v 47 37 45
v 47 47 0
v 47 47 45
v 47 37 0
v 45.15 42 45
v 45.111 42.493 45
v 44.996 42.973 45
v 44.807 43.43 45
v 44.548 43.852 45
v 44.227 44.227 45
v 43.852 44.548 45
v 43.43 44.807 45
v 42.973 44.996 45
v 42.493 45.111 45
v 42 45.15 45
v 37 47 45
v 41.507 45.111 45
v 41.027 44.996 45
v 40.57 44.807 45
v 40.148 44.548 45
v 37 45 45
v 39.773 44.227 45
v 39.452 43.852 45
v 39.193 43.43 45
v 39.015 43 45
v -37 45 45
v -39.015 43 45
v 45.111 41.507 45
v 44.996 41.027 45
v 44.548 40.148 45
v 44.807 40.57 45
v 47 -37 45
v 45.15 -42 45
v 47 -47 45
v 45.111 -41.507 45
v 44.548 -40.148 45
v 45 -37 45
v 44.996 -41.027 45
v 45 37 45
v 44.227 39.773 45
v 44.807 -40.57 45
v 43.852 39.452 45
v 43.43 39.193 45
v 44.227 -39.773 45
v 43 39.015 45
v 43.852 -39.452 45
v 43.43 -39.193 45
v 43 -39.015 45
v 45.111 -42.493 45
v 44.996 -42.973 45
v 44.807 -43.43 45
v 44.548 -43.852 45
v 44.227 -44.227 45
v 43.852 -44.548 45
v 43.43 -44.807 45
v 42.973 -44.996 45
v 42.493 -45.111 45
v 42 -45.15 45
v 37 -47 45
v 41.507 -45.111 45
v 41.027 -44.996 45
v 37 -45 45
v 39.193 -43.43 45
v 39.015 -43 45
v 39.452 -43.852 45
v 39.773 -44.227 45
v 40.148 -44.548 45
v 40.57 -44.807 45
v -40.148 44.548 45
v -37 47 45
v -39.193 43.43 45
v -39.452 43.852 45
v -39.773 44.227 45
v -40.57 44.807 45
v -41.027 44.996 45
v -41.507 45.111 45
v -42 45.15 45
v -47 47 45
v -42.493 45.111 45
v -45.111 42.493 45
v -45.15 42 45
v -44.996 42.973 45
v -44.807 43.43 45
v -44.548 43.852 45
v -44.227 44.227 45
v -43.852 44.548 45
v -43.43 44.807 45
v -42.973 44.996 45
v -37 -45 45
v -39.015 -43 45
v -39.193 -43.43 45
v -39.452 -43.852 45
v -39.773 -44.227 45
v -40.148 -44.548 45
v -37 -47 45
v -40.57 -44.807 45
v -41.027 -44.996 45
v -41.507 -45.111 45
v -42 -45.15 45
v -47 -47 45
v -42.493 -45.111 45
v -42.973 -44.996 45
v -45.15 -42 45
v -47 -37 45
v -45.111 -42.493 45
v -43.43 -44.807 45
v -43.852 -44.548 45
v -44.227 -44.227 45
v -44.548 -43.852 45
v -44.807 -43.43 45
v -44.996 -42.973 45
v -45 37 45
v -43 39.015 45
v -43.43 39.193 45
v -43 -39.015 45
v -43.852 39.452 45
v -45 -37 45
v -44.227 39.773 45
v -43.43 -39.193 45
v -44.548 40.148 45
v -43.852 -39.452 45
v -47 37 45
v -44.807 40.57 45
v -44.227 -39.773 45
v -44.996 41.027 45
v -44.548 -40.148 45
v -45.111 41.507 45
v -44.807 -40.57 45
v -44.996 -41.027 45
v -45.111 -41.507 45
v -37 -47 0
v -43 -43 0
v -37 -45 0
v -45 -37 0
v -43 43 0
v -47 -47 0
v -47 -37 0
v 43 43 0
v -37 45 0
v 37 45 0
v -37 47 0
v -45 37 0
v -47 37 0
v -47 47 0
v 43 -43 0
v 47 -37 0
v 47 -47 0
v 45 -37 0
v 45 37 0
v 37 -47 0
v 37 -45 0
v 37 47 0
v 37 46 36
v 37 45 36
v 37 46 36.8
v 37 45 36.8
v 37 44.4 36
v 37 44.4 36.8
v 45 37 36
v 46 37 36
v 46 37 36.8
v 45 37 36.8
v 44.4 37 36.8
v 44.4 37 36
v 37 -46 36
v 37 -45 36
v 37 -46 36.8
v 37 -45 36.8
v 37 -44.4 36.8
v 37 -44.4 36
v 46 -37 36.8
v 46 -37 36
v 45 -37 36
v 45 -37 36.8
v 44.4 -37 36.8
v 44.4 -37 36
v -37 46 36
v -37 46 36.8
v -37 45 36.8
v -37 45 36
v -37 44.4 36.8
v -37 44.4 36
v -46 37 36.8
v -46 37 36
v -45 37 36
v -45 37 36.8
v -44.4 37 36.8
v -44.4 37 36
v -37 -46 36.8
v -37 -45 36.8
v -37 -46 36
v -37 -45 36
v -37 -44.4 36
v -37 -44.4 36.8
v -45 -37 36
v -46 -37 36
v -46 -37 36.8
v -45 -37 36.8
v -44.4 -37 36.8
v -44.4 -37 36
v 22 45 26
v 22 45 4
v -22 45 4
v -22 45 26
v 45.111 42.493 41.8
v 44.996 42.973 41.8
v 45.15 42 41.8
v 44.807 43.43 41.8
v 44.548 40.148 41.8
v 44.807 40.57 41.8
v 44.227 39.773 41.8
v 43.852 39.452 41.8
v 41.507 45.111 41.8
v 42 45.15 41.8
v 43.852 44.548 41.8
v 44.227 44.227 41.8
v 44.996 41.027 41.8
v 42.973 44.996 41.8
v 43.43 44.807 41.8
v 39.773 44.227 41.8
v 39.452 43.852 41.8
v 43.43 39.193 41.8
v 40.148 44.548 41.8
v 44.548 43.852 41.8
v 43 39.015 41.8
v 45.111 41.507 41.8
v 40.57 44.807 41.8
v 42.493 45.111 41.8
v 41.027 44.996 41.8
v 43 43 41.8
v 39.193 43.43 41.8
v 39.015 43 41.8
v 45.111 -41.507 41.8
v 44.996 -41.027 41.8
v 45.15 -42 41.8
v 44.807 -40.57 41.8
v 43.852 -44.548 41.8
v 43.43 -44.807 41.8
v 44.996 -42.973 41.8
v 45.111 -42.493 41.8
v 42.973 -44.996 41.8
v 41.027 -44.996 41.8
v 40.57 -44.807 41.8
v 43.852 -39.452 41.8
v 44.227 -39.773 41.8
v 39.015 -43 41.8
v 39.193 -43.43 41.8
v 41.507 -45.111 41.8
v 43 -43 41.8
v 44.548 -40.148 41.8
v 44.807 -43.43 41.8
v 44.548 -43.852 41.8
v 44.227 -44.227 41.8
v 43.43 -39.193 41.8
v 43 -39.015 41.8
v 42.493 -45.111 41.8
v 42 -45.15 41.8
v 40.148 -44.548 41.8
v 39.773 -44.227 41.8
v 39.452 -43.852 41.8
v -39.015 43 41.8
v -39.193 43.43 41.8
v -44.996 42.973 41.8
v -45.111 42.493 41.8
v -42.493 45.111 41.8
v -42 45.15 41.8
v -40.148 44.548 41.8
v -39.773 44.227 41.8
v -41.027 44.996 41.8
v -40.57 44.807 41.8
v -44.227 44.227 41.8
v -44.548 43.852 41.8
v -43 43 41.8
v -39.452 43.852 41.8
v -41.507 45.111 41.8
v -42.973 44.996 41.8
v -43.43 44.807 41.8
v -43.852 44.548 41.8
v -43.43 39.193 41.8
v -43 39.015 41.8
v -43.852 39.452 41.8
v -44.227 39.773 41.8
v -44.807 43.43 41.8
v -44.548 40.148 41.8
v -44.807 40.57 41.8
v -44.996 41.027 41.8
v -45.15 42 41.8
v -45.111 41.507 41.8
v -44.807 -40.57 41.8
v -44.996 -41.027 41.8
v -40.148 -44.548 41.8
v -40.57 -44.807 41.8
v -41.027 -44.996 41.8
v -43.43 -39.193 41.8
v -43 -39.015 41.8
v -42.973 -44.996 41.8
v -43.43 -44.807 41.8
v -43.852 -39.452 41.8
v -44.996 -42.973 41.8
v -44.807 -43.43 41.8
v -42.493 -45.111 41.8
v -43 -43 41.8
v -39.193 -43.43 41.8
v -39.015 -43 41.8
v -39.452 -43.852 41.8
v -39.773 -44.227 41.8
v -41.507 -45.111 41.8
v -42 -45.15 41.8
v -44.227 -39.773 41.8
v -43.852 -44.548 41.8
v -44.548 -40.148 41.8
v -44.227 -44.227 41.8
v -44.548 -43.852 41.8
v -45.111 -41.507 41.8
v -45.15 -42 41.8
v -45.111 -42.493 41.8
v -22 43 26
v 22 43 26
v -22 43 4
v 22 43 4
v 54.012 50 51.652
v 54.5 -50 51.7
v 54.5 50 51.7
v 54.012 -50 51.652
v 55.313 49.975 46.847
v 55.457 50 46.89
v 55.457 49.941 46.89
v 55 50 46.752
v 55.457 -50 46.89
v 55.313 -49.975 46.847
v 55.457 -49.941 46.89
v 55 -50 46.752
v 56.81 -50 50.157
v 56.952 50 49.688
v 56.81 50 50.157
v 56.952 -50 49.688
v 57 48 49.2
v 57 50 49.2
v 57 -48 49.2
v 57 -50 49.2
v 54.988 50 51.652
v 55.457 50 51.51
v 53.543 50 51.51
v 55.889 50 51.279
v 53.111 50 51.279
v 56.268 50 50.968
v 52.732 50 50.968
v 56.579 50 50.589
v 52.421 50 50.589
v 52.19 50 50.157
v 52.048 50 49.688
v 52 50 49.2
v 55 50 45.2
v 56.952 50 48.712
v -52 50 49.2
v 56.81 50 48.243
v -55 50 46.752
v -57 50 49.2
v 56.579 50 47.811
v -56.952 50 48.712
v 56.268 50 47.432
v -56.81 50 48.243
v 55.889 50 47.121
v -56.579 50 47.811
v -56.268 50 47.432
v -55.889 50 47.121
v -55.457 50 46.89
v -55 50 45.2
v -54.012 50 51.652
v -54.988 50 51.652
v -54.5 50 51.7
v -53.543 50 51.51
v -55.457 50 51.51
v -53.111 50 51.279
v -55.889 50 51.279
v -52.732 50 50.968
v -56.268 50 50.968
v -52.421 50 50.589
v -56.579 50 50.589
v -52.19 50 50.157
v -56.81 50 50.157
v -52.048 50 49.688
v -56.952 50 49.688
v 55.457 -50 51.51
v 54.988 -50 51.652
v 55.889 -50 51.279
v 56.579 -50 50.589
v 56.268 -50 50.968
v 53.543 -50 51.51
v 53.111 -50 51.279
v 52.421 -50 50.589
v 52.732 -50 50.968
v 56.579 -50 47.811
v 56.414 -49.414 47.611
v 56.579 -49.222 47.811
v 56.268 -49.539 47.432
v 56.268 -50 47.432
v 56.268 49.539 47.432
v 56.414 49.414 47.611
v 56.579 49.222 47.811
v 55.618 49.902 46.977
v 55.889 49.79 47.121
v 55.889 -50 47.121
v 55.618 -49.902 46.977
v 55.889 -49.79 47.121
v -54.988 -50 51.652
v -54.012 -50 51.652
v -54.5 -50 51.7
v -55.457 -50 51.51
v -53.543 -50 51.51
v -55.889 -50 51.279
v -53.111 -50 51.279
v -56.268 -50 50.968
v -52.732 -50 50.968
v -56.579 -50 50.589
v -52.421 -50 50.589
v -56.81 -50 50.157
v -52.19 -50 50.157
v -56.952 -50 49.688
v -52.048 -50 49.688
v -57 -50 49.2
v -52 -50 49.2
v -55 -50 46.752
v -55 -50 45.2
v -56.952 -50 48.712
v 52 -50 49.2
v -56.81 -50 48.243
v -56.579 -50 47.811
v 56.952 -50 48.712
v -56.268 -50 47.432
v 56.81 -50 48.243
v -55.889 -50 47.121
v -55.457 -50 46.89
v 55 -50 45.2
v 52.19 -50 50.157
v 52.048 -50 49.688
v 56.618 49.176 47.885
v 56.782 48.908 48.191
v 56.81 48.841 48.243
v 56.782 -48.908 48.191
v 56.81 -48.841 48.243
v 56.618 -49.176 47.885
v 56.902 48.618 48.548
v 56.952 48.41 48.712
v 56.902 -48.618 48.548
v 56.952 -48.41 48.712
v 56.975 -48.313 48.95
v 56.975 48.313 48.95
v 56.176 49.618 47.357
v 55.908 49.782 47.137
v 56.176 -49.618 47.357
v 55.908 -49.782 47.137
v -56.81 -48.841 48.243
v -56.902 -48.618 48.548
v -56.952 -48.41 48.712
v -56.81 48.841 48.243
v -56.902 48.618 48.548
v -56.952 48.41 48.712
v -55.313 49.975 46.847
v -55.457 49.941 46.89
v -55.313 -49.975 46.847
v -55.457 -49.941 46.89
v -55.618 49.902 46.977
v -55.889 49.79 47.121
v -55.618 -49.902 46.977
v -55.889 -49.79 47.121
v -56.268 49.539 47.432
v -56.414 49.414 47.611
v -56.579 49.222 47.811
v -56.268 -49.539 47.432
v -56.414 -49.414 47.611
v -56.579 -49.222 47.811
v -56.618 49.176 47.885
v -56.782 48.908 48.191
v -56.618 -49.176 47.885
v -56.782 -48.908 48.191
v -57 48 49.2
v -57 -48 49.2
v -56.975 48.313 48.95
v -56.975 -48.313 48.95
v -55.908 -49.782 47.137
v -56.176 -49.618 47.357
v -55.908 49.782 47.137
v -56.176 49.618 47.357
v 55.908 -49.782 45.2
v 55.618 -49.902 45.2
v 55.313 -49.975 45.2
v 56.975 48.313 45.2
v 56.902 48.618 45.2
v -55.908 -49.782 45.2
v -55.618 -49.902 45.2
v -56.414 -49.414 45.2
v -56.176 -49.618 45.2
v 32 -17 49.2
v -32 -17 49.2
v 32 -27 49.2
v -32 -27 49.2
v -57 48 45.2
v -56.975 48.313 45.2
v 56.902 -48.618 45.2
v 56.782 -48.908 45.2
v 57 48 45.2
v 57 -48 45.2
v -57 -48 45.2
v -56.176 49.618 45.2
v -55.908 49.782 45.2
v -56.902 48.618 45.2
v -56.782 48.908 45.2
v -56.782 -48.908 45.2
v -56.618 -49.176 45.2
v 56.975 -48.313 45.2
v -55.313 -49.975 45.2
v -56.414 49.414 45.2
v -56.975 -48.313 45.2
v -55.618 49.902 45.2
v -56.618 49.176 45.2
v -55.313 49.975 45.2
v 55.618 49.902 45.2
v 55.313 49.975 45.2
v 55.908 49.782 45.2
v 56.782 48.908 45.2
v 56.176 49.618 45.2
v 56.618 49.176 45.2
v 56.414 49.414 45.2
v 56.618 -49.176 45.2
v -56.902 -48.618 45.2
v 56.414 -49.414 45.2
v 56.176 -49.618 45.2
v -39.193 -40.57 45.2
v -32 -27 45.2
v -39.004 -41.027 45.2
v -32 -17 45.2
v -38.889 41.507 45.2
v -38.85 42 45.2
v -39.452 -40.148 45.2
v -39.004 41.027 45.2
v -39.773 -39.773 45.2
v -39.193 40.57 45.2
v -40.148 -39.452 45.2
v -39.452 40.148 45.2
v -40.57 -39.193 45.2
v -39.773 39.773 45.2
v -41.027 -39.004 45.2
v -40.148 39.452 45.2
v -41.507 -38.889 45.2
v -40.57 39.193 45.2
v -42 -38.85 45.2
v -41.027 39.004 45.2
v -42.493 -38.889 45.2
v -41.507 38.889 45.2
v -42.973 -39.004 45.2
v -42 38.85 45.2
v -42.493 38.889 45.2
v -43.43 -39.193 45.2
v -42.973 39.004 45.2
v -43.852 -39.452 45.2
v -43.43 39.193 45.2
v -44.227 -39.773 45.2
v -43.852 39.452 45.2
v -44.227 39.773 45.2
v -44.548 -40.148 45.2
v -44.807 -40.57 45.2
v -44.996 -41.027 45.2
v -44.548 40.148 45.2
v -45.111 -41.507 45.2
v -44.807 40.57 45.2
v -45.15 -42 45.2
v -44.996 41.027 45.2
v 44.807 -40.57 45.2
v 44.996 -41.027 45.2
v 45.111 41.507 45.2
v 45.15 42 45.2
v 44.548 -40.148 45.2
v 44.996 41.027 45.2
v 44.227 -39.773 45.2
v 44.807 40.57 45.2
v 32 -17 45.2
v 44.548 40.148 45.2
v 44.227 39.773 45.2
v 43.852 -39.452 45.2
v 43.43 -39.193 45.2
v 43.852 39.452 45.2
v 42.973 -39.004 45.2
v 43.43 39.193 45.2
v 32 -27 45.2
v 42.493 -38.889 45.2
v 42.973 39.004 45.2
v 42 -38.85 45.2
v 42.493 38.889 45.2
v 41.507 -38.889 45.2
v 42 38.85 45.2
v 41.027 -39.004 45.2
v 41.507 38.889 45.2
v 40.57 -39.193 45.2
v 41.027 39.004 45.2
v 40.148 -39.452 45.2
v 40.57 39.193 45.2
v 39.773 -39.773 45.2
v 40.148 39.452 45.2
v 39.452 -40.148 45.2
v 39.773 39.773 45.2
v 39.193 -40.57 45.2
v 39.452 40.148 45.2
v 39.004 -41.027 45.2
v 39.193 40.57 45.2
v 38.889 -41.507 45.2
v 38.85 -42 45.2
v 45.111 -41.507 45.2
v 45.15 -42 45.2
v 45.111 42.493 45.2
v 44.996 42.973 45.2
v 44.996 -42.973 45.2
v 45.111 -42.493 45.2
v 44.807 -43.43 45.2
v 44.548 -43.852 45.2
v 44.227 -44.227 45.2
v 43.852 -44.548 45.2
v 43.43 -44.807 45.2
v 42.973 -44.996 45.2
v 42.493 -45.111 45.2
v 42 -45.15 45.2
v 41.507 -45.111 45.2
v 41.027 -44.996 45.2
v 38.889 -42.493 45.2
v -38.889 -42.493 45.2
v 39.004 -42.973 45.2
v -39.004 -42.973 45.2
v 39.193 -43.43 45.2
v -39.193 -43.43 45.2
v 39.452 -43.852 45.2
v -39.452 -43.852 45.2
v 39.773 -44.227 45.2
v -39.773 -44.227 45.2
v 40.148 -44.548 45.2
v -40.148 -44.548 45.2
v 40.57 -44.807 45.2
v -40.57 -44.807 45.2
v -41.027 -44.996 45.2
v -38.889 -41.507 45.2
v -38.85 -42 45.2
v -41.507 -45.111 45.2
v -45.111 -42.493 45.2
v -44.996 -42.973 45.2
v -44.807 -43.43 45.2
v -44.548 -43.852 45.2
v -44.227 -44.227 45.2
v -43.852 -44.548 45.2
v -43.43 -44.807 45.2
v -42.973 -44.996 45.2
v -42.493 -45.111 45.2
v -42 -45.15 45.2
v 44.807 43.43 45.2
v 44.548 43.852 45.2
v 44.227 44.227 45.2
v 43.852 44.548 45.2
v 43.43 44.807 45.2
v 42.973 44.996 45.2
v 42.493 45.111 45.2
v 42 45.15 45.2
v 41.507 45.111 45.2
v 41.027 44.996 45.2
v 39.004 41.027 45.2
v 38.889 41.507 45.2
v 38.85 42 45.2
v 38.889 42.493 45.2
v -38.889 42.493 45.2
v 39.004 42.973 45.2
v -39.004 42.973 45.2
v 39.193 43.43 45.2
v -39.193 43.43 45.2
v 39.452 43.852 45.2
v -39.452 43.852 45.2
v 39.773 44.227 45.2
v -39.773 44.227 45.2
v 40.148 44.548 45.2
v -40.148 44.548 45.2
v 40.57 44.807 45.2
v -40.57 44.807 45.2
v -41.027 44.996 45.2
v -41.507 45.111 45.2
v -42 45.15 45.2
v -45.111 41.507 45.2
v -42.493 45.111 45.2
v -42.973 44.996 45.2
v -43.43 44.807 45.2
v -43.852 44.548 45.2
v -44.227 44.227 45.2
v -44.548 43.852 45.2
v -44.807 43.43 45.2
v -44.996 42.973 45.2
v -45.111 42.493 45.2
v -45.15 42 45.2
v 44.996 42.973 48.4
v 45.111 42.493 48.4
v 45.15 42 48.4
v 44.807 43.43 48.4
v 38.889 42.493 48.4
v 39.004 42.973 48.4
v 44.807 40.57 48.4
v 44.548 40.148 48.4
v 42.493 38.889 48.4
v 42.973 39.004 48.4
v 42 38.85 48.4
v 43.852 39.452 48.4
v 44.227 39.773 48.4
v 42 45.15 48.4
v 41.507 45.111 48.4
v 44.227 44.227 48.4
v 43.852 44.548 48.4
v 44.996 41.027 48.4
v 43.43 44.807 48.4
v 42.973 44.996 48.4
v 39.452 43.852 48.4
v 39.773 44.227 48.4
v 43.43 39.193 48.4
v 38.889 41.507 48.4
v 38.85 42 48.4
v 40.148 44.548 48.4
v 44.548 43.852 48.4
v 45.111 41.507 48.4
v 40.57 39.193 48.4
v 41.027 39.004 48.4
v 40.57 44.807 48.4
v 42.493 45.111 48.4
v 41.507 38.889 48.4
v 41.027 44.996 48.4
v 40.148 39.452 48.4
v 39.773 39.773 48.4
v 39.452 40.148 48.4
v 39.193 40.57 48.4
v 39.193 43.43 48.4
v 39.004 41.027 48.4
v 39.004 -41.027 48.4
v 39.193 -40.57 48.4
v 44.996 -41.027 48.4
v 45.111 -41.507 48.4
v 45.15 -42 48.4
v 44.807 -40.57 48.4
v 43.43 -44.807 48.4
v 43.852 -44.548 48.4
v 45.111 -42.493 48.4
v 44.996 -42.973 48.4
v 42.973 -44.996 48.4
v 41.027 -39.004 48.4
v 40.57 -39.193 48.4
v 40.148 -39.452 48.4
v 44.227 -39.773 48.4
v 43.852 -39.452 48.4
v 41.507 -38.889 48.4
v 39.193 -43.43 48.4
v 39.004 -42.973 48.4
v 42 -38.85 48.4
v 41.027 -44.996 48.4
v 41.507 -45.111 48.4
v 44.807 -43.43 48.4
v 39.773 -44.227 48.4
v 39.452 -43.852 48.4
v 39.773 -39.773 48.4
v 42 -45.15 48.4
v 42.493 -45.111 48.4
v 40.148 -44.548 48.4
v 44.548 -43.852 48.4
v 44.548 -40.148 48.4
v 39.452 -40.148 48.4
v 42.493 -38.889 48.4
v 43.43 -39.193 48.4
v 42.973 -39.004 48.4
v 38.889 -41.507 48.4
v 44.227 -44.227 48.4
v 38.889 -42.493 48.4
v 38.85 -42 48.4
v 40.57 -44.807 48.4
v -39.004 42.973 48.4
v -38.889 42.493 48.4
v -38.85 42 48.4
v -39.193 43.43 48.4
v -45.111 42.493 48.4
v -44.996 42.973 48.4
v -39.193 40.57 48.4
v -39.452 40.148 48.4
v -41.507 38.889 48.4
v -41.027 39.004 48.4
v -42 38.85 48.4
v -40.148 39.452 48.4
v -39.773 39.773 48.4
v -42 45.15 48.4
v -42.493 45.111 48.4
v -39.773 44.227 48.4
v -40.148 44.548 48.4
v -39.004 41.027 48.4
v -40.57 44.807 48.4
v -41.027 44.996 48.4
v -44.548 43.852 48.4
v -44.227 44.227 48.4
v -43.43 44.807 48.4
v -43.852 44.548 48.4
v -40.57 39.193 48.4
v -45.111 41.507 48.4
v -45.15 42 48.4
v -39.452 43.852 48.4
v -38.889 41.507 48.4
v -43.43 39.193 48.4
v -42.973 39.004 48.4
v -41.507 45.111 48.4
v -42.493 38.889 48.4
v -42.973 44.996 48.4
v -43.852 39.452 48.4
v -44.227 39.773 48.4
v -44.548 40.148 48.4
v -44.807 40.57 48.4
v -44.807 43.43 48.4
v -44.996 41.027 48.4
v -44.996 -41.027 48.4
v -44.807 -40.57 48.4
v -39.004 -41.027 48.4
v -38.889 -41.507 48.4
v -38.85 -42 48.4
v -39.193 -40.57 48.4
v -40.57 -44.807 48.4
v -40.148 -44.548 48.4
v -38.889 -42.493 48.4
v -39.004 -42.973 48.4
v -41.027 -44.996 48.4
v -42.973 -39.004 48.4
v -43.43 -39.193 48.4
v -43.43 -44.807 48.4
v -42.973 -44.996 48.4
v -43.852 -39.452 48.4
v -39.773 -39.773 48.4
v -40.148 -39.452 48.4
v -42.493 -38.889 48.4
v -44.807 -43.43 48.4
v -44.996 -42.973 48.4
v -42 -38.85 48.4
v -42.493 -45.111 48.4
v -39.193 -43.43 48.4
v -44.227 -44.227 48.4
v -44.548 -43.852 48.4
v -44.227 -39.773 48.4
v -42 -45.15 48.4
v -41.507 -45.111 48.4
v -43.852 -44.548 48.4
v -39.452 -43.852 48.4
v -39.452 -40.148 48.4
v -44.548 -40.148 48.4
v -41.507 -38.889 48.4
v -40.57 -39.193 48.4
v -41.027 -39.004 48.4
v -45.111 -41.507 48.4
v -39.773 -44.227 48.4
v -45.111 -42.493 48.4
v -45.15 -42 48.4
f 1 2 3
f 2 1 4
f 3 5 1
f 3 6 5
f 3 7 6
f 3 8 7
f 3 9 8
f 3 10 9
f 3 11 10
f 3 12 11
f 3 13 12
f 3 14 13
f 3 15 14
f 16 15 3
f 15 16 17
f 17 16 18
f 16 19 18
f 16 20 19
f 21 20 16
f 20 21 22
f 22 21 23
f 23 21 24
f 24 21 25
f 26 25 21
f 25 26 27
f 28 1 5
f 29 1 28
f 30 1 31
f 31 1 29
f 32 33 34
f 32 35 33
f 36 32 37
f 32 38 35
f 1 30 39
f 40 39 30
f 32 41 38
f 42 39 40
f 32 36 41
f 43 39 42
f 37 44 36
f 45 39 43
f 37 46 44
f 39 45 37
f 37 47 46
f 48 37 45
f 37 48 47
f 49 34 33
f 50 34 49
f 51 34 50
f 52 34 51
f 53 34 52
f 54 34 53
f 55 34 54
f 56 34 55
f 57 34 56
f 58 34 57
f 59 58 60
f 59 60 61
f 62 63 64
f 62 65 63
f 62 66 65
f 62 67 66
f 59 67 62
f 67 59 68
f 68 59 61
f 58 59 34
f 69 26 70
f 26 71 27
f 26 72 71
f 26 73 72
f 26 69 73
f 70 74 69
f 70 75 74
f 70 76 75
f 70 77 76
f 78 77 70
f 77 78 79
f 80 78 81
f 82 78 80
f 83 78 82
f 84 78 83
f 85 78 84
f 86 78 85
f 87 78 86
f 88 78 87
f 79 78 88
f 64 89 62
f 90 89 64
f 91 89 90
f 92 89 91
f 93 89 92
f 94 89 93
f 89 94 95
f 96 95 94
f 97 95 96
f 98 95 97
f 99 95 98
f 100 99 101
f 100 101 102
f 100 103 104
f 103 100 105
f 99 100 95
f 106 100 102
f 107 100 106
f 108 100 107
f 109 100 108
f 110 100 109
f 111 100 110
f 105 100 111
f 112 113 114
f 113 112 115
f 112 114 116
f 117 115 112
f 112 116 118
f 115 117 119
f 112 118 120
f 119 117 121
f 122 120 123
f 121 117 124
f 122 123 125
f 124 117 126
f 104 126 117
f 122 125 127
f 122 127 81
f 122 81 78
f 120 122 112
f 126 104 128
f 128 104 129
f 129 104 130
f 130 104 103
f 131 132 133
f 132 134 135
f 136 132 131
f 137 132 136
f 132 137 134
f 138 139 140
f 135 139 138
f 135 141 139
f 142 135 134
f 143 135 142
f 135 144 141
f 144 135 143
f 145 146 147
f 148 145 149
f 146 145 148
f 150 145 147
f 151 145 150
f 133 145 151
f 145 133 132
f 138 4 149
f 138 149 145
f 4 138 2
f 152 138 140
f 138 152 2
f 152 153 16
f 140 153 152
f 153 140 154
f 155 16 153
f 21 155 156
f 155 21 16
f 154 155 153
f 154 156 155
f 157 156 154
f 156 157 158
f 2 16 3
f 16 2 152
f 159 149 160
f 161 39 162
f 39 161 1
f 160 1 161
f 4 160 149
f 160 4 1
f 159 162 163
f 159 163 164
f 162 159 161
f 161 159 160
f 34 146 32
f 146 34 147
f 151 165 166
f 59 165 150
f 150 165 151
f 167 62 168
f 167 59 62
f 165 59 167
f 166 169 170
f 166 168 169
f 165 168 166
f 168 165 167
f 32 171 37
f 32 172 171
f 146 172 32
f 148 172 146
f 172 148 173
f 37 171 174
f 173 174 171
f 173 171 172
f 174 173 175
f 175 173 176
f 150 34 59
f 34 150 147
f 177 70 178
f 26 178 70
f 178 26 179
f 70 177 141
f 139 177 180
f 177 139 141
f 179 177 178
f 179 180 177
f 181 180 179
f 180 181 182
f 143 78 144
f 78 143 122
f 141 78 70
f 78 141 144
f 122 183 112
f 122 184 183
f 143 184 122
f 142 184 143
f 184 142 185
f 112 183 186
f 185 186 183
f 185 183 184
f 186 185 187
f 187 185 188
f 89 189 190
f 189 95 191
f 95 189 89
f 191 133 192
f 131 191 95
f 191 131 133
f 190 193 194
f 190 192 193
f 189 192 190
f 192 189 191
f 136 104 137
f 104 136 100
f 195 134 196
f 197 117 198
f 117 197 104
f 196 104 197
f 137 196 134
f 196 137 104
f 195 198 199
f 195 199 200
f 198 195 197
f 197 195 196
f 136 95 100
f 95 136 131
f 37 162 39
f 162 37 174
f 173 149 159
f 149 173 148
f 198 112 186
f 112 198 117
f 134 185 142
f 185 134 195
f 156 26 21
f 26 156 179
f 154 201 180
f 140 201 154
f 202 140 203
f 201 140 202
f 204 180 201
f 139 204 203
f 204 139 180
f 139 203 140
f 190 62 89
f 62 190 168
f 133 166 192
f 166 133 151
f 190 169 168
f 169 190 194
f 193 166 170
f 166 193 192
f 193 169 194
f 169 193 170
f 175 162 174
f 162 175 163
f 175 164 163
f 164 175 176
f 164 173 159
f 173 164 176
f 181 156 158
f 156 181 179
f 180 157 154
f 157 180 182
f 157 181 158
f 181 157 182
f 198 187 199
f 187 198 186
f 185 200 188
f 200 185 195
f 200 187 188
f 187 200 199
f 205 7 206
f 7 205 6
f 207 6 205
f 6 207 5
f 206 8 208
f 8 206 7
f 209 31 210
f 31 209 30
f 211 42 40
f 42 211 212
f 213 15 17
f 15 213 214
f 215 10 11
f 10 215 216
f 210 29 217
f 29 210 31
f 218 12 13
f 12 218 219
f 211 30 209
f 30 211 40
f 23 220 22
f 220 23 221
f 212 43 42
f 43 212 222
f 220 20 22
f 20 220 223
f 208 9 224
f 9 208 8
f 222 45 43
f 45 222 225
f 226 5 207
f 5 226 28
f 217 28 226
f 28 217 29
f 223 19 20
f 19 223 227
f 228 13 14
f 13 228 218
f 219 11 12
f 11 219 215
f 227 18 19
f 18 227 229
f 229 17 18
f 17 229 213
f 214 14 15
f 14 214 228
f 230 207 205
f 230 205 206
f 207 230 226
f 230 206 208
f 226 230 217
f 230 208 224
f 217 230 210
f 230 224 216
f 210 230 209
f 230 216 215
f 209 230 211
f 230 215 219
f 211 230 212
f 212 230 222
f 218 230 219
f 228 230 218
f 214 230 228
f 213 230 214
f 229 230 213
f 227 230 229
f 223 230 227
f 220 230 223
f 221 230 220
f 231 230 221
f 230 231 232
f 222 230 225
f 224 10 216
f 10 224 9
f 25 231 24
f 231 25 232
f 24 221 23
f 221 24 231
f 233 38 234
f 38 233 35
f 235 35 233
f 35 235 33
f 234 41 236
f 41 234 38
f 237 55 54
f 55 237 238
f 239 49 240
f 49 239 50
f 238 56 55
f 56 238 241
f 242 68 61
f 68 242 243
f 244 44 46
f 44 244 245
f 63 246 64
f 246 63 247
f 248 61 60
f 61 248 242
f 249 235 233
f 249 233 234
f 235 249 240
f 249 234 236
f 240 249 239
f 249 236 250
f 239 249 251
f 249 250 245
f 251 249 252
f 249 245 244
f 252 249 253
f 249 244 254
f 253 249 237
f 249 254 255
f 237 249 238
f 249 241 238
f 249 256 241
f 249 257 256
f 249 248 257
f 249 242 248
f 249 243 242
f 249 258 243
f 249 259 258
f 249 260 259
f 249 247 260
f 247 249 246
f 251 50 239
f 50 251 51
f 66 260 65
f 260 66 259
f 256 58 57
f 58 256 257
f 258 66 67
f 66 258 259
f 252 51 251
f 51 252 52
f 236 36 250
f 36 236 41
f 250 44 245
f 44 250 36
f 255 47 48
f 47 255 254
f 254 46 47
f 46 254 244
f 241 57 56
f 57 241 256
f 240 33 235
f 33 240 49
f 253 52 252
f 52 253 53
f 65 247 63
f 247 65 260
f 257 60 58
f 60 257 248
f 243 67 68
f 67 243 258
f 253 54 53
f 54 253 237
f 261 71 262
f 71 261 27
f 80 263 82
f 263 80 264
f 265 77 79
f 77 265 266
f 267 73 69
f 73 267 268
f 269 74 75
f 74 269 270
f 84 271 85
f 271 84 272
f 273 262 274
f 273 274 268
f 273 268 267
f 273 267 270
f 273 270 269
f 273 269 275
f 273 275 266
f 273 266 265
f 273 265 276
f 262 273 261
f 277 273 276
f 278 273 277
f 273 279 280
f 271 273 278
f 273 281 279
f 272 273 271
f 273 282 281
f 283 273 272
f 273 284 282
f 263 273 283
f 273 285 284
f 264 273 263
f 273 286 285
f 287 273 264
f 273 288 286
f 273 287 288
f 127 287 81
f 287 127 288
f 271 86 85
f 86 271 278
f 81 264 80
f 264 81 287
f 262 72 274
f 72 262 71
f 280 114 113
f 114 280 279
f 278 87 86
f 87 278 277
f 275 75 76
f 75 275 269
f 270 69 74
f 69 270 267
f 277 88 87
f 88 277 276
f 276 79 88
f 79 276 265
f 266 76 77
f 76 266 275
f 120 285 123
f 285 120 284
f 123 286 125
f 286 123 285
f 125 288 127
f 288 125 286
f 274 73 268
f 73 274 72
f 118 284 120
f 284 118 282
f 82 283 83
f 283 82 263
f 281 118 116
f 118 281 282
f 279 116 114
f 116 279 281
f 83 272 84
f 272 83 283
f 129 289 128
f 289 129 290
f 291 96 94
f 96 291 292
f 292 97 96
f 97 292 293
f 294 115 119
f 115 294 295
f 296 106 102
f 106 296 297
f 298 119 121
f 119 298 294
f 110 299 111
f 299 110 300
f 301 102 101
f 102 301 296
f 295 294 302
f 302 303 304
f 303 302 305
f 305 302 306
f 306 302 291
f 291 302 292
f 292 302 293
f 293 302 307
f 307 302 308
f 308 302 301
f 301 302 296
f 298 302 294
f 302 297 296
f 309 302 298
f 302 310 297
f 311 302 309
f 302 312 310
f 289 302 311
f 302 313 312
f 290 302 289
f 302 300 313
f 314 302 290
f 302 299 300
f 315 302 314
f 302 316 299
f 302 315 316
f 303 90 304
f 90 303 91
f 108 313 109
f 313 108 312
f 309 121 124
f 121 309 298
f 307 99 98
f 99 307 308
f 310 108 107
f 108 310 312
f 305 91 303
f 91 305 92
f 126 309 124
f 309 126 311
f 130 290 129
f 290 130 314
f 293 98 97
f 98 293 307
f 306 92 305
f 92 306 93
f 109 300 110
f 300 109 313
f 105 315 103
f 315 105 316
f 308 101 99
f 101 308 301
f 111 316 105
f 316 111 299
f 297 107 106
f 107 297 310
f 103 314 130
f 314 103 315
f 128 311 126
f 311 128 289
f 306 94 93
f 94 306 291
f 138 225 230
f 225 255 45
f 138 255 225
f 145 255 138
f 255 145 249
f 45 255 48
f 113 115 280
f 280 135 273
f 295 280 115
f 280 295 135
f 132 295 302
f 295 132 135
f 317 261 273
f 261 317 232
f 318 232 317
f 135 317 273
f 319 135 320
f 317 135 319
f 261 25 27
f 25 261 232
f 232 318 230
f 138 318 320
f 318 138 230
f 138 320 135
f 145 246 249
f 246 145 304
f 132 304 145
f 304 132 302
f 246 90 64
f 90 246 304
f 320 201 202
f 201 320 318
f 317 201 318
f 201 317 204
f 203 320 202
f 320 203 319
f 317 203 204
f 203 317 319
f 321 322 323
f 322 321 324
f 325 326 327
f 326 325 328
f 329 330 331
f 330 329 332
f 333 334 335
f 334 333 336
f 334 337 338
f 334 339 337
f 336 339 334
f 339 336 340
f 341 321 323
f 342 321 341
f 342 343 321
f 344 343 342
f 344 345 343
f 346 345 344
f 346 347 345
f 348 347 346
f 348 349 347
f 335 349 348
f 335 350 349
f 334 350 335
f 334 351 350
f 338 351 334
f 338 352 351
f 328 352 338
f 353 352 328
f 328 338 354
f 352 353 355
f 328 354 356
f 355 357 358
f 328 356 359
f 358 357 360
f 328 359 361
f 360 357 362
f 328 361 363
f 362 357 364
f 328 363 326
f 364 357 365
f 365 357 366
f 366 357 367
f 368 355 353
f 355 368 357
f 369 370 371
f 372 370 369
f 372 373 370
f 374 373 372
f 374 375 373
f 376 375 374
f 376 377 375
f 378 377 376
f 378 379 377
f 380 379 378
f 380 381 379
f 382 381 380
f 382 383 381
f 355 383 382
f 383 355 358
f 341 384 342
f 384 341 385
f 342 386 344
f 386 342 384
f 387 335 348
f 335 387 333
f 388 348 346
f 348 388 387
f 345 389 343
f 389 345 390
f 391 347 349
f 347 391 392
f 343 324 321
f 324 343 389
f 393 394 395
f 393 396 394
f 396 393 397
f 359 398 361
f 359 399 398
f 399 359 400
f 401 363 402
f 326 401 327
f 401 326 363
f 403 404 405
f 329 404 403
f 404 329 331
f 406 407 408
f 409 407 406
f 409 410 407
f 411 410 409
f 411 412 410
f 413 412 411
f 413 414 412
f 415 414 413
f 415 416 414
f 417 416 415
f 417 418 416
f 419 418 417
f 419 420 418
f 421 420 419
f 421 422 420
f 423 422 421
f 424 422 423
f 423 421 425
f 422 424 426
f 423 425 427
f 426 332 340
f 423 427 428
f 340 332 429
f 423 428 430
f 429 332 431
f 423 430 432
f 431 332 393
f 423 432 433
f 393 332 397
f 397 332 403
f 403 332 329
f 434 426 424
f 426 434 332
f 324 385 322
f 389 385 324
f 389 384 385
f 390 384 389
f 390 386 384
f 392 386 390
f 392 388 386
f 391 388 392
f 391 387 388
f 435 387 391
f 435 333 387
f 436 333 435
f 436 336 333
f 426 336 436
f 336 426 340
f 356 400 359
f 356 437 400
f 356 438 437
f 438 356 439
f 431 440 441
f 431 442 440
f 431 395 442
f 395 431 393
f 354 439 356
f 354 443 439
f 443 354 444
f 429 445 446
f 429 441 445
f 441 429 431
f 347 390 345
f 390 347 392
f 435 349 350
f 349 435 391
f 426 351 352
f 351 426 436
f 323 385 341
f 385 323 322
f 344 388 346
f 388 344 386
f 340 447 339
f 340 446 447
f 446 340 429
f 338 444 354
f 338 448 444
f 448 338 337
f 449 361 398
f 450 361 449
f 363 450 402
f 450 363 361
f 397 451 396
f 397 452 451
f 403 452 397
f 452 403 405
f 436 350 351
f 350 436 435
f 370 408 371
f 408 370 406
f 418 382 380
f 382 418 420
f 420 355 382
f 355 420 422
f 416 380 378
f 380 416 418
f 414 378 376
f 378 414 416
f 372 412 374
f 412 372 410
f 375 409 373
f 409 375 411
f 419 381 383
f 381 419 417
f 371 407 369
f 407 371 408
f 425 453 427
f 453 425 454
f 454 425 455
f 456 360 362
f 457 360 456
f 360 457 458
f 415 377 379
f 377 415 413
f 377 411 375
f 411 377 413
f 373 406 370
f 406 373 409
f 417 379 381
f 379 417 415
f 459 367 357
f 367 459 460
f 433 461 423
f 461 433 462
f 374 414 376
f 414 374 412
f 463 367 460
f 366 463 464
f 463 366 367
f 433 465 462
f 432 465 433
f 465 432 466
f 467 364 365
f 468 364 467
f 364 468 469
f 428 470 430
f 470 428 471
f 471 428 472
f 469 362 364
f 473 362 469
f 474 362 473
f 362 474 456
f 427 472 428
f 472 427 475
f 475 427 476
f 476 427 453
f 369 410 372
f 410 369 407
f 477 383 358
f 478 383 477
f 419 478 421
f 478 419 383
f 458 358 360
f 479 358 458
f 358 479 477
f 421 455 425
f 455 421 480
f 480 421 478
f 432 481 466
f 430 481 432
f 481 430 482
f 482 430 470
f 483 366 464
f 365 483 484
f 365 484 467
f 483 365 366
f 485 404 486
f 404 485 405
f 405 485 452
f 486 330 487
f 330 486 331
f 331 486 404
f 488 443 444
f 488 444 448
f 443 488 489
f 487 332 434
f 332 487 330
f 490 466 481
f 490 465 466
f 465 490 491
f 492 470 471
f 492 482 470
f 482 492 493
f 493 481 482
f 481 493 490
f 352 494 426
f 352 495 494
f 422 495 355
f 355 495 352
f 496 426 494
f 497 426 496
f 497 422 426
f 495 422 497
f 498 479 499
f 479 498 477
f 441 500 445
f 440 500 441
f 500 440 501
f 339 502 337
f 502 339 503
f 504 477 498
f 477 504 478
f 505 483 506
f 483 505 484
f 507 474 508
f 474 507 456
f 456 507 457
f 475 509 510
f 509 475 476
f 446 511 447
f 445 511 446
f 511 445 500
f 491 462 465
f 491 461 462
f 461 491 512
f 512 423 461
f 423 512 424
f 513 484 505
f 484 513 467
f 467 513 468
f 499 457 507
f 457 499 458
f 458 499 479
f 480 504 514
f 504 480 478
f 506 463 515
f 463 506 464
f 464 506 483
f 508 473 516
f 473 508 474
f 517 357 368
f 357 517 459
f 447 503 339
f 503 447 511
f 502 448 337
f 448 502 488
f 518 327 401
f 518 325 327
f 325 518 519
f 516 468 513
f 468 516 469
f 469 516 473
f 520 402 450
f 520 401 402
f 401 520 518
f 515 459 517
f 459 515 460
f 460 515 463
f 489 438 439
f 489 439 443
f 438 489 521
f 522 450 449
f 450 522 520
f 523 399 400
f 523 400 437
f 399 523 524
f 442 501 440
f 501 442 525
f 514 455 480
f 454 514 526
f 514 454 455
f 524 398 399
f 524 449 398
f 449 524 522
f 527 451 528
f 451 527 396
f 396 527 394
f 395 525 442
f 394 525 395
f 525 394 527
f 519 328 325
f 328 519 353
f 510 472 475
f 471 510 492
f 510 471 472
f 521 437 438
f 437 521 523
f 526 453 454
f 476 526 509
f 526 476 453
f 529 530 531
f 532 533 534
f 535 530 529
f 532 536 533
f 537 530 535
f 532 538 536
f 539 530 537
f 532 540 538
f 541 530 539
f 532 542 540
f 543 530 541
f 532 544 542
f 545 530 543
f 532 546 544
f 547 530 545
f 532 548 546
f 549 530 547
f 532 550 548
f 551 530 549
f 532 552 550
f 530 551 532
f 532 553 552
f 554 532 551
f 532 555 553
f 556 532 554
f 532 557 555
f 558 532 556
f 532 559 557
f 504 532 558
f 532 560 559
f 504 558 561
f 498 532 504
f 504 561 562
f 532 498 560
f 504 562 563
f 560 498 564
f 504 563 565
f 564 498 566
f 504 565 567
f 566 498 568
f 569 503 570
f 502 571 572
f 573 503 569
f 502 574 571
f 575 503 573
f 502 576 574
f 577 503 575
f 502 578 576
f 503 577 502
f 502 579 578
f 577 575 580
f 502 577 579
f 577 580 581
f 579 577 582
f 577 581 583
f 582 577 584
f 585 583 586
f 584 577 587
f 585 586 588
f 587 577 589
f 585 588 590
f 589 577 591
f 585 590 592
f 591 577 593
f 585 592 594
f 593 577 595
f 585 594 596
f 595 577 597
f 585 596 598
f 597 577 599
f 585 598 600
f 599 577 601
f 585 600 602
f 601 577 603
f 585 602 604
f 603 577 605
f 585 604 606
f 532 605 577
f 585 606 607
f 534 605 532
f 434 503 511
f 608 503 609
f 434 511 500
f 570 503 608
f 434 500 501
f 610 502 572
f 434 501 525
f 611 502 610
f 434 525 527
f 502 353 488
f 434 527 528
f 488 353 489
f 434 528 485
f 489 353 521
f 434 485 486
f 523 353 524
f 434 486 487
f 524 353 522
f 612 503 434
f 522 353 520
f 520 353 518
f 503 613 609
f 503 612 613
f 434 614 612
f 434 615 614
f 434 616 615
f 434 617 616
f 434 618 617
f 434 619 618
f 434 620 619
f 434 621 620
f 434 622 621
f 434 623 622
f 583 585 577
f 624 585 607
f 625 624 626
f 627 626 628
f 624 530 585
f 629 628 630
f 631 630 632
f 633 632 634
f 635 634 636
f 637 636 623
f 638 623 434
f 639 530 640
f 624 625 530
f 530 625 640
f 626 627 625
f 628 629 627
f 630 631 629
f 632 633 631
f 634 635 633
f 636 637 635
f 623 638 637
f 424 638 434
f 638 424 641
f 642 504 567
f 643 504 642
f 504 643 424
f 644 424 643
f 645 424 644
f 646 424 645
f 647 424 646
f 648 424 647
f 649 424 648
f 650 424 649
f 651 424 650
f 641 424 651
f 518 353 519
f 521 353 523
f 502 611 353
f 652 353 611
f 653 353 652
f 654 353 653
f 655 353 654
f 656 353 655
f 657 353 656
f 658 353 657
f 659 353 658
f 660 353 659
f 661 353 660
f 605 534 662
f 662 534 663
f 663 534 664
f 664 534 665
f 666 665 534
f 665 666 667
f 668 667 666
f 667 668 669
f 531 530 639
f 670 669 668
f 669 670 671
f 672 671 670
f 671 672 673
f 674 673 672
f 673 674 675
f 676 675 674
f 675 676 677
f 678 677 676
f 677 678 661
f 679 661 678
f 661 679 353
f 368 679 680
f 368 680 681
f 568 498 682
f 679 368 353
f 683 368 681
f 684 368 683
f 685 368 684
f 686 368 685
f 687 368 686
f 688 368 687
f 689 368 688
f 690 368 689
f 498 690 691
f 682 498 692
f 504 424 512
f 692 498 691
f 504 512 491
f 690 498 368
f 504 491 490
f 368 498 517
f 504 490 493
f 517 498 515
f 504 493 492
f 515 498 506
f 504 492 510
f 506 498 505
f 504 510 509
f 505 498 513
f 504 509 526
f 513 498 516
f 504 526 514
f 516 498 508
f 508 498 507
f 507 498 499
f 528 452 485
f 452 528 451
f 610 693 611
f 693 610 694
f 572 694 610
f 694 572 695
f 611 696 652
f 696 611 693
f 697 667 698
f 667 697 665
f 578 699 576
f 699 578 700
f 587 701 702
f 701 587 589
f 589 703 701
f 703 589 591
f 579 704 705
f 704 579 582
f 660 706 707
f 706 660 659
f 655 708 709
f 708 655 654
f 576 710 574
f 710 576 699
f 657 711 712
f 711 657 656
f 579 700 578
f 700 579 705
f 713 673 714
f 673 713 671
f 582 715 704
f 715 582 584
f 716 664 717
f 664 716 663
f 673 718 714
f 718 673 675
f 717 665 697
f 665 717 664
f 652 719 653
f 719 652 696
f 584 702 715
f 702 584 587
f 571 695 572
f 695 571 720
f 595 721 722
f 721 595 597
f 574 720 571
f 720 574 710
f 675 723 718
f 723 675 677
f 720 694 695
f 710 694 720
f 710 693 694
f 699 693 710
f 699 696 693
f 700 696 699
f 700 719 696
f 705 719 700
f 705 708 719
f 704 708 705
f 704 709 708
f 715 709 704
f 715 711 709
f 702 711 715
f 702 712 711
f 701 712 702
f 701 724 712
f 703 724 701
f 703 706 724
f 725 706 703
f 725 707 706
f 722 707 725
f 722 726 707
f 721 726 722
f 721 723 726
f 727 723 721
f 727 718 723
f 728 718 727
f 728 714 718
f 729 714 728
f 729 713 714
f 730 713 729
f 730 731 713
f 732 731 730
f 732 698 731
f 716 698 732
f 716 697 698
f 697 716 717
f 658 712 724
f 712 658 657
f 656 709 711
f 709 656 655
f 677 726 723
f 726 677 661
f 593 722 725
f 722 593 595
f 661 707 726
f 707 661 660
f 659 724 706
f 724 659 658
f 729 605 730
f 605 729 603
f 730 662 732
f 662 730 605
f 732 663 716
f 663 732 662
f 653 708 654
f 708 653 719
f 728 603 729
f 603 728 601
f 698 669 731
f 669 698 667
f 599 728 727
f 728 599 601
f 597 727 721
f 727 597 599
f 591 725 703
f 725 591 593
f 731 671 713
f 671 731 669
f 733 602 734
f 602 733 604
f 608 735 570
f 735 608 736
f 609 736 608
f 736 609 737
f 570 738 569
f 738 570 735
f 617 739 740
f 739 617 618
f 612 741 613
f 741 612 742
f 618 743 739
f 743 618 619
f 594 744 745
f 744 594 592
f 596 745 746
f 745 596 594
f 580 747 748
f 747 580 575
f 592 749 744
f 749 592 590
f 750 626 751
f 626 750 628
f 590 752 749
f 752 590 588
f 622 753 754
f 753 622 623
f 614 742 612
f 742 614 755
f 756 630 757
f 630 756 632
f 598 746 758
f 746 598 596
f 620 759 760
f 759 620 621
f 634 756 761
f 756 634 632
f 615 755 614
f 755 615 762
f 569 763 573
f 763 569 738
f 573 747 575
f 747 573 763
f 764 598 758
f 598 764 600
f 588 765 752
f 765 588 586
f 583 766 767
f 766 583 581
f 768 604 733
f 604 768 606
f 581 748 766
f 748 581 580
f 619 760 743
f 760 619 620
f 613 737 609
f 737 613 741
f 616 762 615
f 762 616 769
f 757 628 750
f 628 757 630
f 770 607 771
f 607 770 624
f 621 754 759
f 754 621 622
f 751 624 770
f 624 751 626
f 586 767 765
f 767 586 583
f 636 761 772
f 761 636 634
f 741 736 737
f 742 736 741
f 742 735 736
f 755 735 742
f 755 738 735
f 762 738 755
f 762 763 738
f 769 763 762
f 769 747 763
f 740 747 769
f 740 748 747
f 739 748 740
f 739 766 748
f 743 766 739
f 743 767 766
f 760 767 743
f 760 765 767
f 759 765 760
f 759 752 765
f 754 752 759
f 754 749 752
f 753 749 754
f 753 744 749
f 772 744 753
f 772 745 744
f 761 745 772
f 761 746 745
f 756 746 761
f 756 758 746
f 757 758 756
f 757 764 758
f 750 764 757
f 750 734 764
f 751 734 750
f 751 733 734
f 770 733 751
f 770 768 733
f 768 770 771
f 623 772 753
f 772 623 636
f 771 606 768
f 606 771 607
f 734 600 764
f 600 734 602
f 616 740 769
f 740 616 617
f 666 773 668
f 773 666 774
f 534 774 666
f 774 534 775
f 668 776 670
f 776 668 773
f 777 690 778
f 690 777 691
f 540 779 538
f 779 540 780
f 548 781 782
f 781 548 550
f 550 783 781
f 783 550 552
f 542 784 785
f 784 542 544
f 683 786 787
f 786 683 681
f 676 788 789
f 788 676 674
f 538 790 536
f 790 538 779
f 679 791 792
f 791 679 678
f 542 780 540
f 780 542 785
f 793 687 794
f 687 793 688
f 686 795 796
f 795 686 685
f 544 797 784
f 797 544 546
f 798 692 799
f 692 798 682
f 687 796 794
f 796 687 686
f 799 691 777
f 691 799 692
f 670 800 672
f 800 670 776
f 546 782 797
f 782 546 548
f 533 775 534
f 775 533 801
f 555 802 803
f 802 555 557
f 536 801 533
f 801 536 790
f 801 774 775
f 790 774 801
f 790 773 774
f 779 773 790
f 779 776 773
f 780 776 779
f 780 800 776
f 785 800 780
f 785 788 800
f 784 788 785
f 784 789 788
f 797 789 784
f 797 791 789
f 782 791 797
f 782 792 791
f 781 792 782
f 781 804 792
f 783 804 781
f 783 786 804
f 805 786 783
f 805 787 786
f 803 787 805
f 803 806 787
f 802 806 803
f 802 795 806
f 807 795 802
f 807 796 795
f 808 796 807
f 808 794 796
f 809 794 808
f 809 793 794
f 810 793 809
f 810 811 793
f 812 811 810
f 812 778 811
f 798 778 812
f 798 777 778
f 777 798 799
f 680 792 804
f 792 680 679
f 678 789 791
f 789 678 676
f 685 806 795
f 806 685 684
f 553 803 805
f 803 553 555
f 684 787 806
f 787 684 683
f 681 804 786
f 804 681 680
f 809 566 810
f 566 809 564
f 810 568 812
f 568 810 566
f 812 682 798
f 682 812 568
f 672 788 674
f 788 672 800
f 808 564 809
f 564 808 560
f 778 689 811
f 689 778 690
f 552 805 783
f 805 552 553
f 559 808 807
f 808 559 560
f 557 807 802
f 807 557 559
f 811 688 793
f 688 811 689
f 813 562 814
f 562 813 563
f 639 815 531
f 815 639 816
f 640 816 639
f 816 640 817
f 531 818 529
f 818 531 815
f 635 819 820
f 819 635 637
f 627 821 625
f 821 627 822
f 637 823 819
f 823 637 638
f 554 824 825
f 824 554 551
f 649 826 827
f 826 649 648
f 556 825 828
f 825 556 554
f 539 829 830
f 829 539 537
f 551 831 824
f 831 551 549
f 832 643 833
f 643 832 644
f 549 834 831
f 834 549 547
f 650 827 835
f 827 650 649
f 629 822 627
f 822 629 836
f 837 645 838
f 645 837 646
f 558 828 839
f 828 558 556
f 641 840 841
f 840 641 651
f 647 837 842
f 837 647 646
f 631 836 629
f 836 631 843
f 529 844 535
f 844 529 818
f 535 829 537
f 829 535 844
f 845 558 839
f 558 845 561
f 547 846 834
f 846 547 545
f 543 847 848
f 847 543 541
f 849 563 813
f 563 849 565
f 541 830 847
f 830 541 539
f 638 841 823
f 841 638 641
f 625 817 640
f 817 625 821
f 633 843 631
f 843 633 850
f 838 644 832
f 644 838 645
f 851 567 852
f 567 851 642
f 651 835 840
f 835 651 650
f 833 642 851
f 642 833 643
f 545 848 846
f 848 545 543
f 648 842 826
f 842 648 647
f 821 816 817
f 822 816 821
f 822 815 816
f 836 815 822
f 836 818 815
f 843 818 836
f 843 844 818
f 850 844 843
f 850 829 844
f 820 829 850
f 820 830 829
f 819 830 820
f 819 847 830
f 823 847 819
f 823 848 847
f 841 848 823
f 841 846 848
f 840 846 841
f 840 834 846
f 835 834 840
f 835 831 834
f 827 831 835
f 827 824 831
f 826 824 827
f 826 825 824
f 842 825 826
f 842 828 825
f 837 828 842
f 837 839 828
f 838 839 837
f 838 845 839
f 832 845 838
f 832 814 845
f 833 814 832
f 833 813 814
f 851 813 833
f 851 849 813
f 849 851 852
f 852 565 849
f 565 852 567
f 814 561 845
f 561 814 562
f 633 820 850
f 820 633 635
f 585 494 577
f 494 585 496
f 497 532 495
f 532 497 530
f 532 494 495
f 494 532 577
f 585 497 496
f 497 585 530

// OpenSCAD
// 文机（ふづくえ）：感熱プリンタ BluwieBroka S1 のカバー
//  body … 四隅に脚のある箱。S1 にかぶせる（底なし）。上下開放の筒なのでサポート不要
//  top  … 天板。排紙スリット付き。ネオジム磁石（φ6×3）4個で本体に付く → 外せば紙交換できる
//  ★ S1 到着後に S1_W/S1_D/S1_H と SLOT_X/SLOT_Y、背面窓の位置を実測値に直すこと
part = "assembly";  // "body" | "top" | "assembly"

S1_W = 84; S1_D = 84; S1_H = 43;  // 公称値
CLR = 1;
WALL = 2;
IN_W = S1_W + 2 * CLR; IN_D = S1_D + 2 * CLR;
BODY_H = S1_H + 2;
OUT_W = IN_W + 2 * WALL; OUT_D = IN_D + 2 * WALL;   // 90 × 90
LEG = 10; LEG_OUT = 2;                              // 脚は外へ 2mm 張り出す
LEG_C = OUT_W / 2 + LEG_OUT - LEG / 2;              // 脚の中心（42）
APRON_LINE_Z = BODY_H - 9;                          // 幕板の線

MAG_D = 6.3; MAG_H = 3.2;

TOP_W = 114; TOP_D = 100; TOP_T = 4; TOP_R = 2;
FUDEGAESHI_H = 2.5; FUDEGAESHI_W = 5;  // 筆返し（天板の両端の反り）
SLOT_W = 64; SLOT_D = 10;   // 排紙スリット（幅は紙57mm＋余裕）
SLOT_X = 0; SLOT_Y = -22;   // スリット中心（-Y が手前）★実測で調整
TEAR_CHAMFER = 3;           // 手前側の面取り（紙を手前に引いて切りやすく）

BACK_WIN_W = 44; BACK_WIN_H = 22; BACK_WIN_Z = 4;  // 背面窓（USB・電源ボタン・ランプ）★実測で調整

$fn = 40;

module desk_body() {
  difference() {
    union() {
      translate([-OUT_W / 2, -OUT_D / 2, 0]) cube([OUT_W, OUT_D, BODY_H]);
      for (sx = [1, -1], sy = [1, -1]) translate([sx * LEG_C - LEG / 2, sy * LEG_C - LEG / 2, 0]) cube([LEG, LEG, BODY_H]);
    }
    translate([-IN_W / 2, -IN_D / 2, -1]) cube([IN_W, IN_D, BODY_H + 2]);
    // 幕板の線（細い溝）
    for (r = [0, 90, 180, 270]) rotate([0, 0, r])
      translate([-(LEG_C - LEG / 2), -OUT_D / 2 - 1, APRON_LINE_Z]) cube([2 * (LEG_C - LEG / 2), 1.6, 0.8]);
    // 磁石穴（脚の上面）
    for (sx = [1, -1], sy = [1, -1]) translate([sx * LEG_C, sy * LEG_C, BODY_H - MAG_H]) cylinder(d = MAG_D, h = MAG_H + 1);
    // 背面窓（+Y が奥＝スタッフ側）
    translate([-BACK_WIN_W / 2, OUT_D / 2 - WALL - 1, BACK_WIN_Z]) cube([BACK_WIN_W, WALL + 2, BACK_WIN_H]);
  }
}

module desk_top() {
  difference() {
    union() {
      linear_extrude(TOP_T) offset(TOP_R) square([TOP_W - 2 * TOP_R, TOP_D - 2 * TOP_R], center = true);
      // 筆返し
      for (s = [1, -1]) translate([s * (TOP_W / 2 - FUDEGAESHI_W / 2), 0, TOP_T])
        scale([FUDEGAESHI_W / 2, TOP_D / 2, FUDEGAESHI_H]) rotate([90, 0, 0]) cylinder(r = 1, h = 2, center = true, $fn = 32);
    }
    // 排紙スリット＋手前の面取り
    translate([SLOT_X - SLOT_W / 2, SLOT_Y - SLOT_D / 2, -1]) cube([SLOT_W, SLOT_D, TOP_T + 2]);
    translate([SLOT_X - SLOT_W / 2, SLOT_Y - SLOT_D / 2, TOP_T]) rotate([45, 0, 0]) cube([SLOT_W, TEAR_CHAMFER * 1.42, TEAR_CHAMFER * 1.42], center = false);
    // 磁石穴（裏面）
    for (sx = [1, -1], sy = [1, -1]) translate([sx * LEG_C, sy * LEG_C, -1]) cylinder(d = MAG_D, h = MAG_H + 1);
  }
}

if (part == "body") desk_body();
else if (part == "top") desk_top();
else {
  color([0.12, 0.1, 0.09]) desk_body();
  color([0.15, 0.12, 0.1]) translate([0, 0, BODY_H + 0.2]) desk_top();
}
